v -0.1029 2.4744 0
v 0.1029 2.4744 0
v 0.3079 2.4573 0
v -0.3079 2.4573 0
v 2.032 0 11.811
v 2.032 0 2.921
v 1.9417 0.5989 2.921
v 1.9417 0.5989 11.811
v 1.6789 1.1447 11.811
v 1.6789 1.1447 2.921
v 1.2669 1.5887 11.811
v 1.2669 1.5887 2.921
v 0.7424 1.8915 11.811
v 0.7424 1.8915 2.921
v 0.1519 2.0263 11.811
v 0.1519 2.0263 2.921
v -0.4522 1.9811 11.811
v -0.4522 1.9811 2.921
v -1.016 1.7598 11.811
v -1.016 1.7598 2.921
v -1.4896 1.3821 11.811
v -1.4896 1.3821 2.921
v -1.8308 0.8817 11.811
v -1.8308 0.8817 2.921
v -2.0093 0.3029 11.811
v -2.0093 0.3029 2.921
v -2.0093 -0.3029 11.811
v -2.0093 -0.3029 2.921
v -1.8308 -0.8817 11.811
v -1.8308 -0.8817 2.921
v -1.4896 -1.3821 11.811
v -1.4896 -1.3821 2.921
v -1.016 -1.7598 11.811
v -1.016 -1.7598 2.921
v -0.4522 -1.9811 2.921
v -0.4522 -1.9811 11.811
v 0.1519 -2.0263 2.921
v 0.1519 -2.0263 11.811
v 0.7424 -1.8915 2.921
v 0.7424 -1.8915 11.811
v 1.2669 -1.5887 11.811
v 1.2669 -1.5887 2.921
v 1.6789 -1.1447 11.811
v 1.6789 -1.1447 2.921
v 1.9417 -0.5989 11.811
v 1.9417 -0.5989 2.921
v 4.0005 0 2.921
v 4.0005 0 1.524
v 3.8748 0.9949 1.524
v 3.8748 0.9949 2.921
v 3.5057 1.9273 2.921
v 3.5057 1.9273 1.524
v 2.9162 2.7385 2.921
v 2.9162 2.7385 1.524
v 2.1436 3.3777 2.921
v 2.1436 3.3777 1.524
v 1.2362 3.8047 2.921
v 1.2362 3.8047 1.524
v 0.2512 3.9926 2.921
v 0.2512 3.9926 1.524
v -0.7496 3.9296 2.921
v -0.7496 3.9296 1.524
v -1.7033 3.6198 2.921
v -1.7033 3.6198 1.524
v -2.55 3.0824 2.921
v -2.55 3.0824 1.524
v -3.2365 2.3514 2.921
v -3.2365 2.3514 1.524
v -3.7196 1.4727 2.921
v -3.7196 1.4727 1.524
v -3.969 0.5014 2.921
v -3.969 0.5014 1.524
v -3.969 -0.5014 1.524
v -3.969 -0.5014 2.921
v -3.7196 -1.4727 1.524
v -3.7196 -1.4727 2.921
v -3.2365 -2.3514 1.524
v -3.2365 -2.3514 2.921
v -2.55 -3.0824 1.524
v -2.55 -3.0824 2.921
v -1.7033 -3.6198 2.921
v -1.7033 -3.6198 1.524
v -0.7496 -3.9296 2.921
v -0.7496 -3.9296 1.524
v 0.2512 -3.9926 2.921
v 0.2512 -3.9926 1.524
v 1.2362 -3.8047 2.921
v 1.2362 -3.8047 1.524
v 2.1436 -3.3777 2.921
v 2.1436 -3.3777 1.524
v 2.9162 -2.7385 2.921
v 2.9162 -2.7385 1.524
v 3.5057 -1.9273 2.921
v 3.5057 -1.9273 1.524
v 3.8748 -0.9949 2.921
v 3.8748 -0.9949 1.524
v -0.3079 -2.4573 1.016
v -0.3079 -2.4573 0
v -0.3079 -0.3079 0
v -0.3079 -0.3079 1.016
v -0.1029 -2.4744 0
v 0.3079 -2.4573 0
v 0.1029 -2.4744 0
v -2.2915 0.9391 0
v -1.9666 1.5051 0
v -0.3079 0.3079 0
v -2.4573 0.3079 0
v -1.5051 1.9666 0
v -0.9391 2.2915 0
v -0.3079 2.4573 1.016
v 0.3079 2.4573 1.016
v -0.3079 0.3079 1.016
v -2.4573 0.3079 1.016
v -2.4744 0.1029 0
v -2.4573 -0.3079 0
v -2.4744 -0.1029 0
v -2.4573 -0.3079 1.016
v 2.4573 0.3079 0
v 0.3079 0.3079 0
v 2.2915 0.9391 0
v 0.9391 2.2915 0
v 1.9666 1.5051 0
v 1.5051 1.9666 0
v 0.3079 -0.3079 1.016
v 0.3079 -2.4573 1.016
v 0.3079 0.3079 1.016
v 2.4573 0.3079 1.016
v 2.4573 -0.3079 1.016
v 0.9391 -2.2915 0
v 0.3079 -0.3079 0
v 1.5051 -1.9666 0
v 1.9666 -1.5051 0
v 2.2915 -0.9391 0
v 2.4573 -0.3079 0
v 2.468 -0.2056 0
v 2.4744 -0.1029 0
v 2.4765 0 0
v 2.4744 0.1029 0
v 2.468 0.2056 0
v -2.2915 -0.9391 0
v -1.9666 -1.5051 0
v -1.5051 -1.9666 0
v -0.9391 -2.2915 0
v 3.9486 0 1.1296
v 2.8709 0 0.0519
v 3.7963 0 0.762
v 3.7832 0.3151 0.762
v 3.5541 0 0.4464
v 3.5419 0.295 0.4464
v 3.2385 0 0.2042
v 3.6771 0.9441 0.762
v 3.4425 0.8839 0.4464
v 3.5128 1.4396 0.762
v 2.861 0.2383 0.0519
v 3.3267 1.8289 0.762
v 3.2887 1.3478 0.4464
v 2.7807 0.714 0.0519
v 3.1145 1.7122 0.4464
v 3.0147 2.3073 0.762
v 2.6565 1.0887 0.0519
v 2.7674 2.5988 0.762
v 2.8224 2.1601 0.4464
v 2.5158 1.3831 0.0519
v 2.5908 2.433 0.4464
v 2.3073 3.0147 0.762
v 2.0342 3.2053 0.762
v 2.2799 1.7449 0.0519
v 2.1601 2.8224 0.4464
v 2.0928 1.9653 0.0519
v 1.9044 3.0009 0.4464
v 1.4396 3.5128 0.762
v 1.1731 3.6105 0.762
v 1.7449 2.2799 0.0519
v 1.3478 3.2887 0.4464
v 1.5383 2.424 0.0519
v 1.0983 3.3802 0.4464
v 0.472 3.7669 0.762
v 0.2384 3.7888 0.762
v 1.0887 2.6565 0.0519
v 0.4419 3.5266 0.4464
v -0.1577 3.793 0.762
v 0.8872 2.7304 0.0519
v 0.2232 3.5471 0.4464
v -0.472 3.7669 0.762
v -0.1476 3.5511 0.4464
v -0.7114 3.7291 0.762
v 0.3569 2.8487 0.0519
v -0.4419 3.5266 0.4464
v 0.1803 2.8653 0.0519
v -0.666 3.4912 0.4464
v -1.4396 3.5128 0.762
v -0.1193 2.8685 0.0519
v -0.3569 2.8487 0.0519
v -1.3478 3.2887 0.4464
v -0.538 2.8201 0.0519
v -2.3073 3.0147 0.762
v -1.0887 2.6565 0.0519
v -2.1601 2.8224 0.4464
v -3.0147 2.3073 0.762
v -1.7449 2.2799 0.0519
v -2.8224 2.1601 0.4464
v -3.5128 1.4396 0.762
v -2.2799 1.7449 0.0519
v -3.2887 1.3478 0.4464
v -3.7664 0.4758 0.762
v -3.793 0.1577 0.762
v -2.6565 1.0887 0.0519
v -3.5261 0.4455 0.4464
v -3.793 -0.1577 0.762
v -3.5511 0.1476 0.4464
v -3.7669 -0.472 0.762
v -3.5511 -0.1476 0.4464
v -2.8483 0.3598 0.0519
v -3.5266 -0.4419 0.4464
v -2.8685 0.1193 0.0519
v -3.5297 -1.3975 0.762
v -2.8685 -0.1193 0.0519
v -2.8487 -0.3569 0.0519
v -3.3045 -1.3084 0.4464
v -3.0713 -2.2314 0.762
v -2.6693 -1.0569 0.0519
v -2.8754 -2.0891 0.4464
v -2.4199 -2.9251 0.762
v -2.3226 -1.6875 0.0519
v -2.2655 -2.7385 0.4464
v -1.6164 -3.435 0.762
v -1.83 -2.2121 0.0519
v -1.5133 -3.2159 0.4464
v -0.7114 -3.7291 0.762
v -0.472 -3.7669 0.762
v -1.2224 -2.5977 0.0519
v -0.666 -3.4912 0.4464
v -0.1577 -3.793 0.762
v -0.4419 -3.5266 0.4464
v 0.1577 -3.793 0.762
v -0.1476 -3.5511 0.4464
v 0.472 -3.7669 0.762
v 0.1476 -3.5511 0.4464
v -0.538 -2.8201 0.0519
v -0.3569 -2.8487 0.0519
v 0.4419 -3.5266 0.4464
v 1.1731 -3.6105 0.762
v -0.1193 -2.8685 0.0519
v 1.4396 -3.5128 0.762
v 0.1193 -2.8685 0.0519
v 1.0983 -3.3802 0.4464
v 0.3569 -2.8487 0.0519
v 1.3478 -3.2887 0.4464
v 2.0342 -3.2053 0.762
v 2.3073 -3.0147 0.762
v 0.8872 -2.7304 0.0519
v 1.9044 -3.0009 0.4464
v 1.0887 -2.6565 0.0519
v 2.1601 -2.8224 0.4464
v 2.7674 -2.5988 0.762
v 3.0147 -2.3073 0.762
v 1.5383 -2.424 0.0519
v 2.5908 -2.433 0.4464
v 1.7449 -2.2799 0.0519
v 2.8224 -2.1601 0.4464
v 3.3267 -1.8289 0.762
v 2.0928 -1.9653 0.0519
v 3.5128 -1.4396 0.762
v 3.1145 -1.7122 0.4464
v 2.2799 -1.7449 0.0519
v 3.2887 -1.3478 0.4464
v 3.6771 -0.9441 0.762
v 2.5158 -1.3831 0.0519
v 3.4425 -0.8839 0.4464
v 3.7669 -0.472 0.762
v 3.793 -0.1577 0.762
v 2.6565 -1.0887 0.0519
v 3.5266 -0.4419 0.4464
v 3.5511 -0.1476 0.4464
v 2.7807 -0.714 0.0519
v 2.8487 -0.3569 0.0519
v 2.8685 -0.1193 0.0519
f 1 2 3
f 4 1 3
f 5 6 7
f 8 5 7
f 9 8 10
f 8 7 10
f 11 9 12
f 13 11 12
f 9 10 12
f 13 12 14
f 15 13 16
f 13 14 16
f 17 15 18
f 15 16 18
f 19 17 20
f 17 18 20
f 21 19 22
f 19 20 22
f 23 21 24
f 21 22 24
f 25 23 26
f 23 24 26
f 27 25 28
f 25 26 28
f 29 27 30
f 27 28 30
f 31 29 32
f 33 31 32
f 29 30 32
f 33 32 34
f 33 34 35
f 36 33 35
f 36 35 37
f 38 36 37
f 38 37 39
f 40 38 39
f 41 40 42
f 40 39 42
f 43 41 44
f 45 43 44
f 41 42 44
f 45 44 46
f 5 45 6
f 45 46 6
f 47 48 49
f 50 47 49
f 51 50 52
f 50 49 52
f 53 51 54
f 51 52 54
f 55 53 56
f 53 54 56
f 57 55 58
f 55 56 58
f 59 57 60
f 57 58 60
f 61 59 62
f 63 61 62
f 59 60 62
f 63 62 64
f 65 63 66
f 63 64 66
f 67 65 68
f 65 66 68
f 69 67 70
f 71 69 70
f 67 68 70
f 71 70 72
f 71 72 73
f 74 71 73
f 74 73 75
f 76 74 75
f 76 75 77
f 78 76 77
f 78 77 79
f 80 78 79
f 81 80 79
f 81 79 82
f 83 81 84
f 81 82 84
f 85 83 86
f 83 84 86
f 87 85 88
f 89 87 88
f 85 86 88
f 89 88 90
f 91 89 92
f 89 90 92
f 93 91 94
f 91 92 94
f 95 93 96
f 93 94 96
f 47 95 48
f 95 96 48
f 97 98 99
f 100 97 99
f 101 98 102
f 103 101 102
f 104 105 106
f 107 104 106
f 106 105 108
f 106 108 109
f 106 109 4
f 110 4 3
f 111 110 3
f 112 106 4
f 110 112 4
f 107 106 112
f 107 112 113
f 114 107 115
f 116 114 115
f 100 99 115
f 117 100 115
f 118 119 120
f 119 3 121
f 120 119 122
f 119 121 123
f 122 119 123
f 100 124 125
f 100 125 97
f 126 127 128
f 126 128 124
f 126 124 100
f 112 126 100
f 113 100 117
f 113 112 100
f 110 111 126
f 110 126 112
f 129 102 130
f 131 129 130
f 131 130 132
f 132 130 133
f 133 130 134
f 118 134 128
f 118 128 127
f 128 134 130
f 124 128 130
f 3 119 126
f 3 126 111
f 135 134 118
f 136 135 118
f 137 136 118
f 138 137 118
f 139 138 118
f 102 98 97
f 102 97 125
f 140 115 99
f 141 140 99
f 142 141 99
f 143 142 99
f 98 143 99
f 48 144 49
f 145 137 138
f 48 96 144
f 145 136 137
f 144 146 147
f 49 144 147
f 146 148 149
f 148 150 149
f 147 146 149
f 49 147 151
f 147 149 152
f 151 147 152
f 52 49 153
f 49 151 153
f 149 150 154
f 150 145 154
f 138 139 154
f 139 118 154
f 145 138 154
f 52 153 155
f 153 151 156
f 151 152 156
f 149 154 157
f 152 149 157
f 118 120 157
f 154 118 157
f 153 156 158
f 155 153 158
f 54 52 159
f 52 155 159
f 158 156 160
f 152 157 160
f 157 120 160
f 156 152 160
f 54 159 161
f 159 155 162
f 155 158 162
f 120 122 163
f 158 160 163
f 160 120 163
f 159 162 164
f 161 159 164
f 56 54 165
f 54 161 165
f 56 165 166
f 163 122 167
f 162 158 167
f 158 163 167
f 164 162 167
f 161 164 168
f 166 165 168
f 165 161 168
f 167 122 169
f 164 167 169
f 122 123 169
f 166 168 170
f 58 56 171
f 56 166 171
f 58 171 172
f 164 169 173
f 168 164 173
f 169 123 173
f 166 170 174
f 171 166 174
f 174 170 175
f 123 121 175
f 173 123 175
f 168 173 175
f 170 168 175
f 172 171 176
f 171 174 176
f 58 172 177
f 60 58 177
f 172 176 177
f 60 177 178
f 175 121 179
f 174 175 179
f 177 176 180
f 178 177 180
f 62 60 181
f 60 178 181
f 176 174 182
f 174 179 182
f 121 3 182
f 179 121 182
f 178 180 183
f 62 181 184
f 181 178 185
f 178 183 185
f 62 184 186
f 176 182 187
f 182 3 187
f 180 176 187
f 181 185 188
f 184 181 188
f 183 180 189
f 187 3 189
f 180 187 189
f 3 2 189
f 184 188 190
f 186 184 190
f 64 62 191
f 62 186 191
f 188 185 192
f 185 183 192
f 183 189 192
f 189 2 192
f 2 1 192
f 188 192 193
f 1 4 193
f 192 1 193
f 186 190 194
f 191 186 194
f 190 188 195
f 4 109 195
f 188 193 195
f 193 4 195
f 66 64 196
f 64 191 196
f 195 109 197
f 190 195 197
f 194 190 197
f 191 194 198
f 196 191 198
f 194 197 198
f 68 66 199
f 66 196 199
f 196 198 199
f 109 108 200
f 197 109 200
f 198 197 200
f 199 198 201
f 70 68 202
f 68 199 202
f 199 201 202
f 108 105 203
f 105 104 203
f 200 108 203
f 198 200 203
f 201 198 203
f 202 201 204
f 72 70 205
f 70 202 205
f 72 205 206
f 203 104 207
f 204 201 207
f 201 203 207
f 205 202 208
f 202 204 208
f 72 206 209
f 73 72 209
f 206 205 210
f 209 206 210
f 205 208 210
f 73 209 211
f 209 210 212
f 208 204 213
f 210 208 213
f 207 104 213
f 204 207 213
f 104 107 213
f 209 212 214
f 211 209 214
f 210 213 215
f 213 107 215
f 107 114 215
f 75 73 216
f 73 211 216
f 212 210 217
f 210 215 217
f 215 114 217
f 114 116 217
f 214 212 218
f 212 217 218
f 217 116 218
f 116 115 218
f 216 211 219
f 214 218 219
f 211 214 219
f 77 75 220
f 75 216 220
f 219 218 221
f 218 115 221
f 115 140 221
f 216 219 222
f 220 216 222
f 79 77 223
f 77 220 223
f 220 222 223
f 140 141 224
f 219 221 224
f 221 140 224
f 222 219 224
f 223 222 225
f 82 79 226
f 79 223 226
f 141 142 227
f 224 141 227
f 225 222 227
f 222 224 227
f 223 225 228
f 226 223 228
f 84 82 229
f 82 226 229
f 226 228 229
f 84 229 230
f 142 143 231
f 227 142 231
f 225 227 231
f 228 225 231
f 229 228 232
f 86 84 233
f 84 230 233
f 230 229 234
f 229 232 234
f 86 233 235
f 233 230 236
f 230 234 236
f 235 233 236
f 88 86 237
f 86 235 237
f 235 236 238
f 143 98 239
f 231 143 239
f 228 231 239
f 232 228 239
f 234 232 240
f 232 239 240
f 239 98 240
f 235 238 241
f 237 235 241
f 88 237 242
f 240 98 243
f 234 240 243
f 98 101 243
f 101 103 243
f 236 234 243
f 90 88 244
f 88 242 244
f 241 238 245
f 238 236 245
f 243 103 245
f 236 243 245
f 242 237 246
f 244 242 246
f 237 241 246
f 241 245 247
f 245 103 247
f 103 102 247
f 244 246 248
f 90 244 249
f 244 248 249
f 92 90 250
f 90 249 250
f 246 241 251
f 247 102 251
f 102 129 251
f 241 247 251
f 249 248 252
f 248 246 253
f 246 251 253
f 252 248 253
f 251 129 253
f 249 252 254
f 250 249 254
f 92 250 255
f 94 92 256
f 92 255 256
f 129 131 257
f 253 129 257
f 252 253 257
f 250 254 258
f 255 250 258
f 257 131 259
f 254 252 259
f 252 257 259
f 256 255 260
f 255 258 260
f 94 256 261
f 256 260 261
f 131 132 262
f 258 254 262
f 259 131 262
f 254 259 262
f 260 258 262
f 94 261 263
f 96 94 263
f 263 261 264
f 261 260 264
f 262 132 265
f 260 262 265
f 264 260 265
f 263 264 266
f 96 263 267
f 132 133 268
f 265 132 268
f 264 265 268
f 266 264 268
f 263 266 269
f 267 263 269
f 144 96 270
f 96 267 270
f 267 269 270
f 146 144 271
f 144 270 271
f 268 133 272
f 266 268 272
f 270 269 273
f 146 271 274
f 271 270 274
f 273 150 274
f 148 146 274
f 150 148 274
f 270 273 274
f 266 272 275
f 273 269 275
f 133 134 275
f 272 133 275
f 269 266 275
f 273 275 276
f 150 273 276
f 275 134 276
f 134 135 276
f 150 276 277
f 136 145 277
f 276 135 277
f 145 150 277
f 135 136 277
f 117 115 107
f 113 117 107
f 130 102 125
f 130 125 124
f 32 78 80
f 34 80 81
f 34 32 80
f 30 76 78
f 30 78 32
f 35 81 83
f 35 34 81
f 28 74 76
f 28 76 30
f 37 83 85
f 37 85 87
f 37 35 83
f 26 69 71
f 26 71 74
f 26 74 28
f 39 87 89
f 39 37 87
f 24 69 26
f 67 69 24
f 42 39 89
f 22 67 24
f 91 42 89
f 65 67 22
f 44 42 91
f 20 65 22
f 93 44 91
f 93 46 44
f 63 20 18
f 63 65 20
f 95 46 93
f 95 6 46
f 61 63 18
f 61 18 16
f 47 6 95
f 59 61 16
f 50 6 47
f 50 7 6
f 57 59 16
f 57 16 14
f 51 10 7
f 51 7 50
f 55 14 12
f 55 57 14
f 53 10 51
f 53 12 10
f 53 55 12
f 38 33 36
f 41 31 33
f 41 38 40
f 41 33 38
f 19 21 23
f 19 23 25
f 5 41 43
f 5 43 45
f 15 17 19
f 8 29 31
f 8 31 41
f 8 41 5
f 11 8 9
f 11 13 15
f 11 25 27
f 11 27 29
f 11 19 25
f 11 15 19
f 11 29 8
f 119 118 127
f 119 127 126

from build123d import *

# Parameters (mm, degrees)
SKETCH1_R         = 4.0005
EXTRUDE1_DEPTH    = 2.921
FILLET1_R         = 1.524
SKETCH2_R         = 2.032
EXTRUDE2_DEPTH    = 8.89
SKETCH3_W         = 4.91456988
SKETCH3_H         = 0.615801824
EXTRUDE3_DEPTH    = 1.016
CIRPATTERN1_COUNT = 2
CIRPATTERN1_ANGLE = 90


with BuildPart() as part:
    # Sketch1 → Extrude1 (new body)
    with BuildSketch(Plane.XY):
        Circle(SKETCH1_R)
    extrude(amount=EXTRUDE1_DEPTH)

    # Fillet1
    fillet1_edges = [part.edges().sort_by_distance(p)[0] for p in [
        (-4.0005, 0, 0),
    ]]
    fillet(fillet1_edges, radius=FILLET1_R)

    # Sketch2 → Extrude2 (add)
    with BuildSketch(Plane.XY.offset(2.921)):
        Circle(SKETCH2_R)
    extrude(amount=EXTRUDE2_DEPTH)

    # Sketch3 → Extrude3 (cut)
    with BuildSketch(Plane(origin=(0, 0, 0), x_dir=(-1, 0, 0), z_dir=(0, 0, -1))):
        Rectangle(SKETCH3_W, SKETCH3_H)
    extrude3 = extrude(amount=-EXTRUDE3_DEPTH, mode=Mode.SUBTRACT)

    # CirPattern1: Extrude3 ×2 about axis
    cirpattern1_axis = Axis((0, 0, 0), (0, 0, -1))
    for i in range(1, CIRPATTERN1_COUNT):
        add(extrude3.rotate(cirpattern1_axis, i * CIRPATTERN1_ANGLE / (CIRPATTERN1_COUNT - 1)), mode=Mode.SUBTRACT)


solid = part.part
